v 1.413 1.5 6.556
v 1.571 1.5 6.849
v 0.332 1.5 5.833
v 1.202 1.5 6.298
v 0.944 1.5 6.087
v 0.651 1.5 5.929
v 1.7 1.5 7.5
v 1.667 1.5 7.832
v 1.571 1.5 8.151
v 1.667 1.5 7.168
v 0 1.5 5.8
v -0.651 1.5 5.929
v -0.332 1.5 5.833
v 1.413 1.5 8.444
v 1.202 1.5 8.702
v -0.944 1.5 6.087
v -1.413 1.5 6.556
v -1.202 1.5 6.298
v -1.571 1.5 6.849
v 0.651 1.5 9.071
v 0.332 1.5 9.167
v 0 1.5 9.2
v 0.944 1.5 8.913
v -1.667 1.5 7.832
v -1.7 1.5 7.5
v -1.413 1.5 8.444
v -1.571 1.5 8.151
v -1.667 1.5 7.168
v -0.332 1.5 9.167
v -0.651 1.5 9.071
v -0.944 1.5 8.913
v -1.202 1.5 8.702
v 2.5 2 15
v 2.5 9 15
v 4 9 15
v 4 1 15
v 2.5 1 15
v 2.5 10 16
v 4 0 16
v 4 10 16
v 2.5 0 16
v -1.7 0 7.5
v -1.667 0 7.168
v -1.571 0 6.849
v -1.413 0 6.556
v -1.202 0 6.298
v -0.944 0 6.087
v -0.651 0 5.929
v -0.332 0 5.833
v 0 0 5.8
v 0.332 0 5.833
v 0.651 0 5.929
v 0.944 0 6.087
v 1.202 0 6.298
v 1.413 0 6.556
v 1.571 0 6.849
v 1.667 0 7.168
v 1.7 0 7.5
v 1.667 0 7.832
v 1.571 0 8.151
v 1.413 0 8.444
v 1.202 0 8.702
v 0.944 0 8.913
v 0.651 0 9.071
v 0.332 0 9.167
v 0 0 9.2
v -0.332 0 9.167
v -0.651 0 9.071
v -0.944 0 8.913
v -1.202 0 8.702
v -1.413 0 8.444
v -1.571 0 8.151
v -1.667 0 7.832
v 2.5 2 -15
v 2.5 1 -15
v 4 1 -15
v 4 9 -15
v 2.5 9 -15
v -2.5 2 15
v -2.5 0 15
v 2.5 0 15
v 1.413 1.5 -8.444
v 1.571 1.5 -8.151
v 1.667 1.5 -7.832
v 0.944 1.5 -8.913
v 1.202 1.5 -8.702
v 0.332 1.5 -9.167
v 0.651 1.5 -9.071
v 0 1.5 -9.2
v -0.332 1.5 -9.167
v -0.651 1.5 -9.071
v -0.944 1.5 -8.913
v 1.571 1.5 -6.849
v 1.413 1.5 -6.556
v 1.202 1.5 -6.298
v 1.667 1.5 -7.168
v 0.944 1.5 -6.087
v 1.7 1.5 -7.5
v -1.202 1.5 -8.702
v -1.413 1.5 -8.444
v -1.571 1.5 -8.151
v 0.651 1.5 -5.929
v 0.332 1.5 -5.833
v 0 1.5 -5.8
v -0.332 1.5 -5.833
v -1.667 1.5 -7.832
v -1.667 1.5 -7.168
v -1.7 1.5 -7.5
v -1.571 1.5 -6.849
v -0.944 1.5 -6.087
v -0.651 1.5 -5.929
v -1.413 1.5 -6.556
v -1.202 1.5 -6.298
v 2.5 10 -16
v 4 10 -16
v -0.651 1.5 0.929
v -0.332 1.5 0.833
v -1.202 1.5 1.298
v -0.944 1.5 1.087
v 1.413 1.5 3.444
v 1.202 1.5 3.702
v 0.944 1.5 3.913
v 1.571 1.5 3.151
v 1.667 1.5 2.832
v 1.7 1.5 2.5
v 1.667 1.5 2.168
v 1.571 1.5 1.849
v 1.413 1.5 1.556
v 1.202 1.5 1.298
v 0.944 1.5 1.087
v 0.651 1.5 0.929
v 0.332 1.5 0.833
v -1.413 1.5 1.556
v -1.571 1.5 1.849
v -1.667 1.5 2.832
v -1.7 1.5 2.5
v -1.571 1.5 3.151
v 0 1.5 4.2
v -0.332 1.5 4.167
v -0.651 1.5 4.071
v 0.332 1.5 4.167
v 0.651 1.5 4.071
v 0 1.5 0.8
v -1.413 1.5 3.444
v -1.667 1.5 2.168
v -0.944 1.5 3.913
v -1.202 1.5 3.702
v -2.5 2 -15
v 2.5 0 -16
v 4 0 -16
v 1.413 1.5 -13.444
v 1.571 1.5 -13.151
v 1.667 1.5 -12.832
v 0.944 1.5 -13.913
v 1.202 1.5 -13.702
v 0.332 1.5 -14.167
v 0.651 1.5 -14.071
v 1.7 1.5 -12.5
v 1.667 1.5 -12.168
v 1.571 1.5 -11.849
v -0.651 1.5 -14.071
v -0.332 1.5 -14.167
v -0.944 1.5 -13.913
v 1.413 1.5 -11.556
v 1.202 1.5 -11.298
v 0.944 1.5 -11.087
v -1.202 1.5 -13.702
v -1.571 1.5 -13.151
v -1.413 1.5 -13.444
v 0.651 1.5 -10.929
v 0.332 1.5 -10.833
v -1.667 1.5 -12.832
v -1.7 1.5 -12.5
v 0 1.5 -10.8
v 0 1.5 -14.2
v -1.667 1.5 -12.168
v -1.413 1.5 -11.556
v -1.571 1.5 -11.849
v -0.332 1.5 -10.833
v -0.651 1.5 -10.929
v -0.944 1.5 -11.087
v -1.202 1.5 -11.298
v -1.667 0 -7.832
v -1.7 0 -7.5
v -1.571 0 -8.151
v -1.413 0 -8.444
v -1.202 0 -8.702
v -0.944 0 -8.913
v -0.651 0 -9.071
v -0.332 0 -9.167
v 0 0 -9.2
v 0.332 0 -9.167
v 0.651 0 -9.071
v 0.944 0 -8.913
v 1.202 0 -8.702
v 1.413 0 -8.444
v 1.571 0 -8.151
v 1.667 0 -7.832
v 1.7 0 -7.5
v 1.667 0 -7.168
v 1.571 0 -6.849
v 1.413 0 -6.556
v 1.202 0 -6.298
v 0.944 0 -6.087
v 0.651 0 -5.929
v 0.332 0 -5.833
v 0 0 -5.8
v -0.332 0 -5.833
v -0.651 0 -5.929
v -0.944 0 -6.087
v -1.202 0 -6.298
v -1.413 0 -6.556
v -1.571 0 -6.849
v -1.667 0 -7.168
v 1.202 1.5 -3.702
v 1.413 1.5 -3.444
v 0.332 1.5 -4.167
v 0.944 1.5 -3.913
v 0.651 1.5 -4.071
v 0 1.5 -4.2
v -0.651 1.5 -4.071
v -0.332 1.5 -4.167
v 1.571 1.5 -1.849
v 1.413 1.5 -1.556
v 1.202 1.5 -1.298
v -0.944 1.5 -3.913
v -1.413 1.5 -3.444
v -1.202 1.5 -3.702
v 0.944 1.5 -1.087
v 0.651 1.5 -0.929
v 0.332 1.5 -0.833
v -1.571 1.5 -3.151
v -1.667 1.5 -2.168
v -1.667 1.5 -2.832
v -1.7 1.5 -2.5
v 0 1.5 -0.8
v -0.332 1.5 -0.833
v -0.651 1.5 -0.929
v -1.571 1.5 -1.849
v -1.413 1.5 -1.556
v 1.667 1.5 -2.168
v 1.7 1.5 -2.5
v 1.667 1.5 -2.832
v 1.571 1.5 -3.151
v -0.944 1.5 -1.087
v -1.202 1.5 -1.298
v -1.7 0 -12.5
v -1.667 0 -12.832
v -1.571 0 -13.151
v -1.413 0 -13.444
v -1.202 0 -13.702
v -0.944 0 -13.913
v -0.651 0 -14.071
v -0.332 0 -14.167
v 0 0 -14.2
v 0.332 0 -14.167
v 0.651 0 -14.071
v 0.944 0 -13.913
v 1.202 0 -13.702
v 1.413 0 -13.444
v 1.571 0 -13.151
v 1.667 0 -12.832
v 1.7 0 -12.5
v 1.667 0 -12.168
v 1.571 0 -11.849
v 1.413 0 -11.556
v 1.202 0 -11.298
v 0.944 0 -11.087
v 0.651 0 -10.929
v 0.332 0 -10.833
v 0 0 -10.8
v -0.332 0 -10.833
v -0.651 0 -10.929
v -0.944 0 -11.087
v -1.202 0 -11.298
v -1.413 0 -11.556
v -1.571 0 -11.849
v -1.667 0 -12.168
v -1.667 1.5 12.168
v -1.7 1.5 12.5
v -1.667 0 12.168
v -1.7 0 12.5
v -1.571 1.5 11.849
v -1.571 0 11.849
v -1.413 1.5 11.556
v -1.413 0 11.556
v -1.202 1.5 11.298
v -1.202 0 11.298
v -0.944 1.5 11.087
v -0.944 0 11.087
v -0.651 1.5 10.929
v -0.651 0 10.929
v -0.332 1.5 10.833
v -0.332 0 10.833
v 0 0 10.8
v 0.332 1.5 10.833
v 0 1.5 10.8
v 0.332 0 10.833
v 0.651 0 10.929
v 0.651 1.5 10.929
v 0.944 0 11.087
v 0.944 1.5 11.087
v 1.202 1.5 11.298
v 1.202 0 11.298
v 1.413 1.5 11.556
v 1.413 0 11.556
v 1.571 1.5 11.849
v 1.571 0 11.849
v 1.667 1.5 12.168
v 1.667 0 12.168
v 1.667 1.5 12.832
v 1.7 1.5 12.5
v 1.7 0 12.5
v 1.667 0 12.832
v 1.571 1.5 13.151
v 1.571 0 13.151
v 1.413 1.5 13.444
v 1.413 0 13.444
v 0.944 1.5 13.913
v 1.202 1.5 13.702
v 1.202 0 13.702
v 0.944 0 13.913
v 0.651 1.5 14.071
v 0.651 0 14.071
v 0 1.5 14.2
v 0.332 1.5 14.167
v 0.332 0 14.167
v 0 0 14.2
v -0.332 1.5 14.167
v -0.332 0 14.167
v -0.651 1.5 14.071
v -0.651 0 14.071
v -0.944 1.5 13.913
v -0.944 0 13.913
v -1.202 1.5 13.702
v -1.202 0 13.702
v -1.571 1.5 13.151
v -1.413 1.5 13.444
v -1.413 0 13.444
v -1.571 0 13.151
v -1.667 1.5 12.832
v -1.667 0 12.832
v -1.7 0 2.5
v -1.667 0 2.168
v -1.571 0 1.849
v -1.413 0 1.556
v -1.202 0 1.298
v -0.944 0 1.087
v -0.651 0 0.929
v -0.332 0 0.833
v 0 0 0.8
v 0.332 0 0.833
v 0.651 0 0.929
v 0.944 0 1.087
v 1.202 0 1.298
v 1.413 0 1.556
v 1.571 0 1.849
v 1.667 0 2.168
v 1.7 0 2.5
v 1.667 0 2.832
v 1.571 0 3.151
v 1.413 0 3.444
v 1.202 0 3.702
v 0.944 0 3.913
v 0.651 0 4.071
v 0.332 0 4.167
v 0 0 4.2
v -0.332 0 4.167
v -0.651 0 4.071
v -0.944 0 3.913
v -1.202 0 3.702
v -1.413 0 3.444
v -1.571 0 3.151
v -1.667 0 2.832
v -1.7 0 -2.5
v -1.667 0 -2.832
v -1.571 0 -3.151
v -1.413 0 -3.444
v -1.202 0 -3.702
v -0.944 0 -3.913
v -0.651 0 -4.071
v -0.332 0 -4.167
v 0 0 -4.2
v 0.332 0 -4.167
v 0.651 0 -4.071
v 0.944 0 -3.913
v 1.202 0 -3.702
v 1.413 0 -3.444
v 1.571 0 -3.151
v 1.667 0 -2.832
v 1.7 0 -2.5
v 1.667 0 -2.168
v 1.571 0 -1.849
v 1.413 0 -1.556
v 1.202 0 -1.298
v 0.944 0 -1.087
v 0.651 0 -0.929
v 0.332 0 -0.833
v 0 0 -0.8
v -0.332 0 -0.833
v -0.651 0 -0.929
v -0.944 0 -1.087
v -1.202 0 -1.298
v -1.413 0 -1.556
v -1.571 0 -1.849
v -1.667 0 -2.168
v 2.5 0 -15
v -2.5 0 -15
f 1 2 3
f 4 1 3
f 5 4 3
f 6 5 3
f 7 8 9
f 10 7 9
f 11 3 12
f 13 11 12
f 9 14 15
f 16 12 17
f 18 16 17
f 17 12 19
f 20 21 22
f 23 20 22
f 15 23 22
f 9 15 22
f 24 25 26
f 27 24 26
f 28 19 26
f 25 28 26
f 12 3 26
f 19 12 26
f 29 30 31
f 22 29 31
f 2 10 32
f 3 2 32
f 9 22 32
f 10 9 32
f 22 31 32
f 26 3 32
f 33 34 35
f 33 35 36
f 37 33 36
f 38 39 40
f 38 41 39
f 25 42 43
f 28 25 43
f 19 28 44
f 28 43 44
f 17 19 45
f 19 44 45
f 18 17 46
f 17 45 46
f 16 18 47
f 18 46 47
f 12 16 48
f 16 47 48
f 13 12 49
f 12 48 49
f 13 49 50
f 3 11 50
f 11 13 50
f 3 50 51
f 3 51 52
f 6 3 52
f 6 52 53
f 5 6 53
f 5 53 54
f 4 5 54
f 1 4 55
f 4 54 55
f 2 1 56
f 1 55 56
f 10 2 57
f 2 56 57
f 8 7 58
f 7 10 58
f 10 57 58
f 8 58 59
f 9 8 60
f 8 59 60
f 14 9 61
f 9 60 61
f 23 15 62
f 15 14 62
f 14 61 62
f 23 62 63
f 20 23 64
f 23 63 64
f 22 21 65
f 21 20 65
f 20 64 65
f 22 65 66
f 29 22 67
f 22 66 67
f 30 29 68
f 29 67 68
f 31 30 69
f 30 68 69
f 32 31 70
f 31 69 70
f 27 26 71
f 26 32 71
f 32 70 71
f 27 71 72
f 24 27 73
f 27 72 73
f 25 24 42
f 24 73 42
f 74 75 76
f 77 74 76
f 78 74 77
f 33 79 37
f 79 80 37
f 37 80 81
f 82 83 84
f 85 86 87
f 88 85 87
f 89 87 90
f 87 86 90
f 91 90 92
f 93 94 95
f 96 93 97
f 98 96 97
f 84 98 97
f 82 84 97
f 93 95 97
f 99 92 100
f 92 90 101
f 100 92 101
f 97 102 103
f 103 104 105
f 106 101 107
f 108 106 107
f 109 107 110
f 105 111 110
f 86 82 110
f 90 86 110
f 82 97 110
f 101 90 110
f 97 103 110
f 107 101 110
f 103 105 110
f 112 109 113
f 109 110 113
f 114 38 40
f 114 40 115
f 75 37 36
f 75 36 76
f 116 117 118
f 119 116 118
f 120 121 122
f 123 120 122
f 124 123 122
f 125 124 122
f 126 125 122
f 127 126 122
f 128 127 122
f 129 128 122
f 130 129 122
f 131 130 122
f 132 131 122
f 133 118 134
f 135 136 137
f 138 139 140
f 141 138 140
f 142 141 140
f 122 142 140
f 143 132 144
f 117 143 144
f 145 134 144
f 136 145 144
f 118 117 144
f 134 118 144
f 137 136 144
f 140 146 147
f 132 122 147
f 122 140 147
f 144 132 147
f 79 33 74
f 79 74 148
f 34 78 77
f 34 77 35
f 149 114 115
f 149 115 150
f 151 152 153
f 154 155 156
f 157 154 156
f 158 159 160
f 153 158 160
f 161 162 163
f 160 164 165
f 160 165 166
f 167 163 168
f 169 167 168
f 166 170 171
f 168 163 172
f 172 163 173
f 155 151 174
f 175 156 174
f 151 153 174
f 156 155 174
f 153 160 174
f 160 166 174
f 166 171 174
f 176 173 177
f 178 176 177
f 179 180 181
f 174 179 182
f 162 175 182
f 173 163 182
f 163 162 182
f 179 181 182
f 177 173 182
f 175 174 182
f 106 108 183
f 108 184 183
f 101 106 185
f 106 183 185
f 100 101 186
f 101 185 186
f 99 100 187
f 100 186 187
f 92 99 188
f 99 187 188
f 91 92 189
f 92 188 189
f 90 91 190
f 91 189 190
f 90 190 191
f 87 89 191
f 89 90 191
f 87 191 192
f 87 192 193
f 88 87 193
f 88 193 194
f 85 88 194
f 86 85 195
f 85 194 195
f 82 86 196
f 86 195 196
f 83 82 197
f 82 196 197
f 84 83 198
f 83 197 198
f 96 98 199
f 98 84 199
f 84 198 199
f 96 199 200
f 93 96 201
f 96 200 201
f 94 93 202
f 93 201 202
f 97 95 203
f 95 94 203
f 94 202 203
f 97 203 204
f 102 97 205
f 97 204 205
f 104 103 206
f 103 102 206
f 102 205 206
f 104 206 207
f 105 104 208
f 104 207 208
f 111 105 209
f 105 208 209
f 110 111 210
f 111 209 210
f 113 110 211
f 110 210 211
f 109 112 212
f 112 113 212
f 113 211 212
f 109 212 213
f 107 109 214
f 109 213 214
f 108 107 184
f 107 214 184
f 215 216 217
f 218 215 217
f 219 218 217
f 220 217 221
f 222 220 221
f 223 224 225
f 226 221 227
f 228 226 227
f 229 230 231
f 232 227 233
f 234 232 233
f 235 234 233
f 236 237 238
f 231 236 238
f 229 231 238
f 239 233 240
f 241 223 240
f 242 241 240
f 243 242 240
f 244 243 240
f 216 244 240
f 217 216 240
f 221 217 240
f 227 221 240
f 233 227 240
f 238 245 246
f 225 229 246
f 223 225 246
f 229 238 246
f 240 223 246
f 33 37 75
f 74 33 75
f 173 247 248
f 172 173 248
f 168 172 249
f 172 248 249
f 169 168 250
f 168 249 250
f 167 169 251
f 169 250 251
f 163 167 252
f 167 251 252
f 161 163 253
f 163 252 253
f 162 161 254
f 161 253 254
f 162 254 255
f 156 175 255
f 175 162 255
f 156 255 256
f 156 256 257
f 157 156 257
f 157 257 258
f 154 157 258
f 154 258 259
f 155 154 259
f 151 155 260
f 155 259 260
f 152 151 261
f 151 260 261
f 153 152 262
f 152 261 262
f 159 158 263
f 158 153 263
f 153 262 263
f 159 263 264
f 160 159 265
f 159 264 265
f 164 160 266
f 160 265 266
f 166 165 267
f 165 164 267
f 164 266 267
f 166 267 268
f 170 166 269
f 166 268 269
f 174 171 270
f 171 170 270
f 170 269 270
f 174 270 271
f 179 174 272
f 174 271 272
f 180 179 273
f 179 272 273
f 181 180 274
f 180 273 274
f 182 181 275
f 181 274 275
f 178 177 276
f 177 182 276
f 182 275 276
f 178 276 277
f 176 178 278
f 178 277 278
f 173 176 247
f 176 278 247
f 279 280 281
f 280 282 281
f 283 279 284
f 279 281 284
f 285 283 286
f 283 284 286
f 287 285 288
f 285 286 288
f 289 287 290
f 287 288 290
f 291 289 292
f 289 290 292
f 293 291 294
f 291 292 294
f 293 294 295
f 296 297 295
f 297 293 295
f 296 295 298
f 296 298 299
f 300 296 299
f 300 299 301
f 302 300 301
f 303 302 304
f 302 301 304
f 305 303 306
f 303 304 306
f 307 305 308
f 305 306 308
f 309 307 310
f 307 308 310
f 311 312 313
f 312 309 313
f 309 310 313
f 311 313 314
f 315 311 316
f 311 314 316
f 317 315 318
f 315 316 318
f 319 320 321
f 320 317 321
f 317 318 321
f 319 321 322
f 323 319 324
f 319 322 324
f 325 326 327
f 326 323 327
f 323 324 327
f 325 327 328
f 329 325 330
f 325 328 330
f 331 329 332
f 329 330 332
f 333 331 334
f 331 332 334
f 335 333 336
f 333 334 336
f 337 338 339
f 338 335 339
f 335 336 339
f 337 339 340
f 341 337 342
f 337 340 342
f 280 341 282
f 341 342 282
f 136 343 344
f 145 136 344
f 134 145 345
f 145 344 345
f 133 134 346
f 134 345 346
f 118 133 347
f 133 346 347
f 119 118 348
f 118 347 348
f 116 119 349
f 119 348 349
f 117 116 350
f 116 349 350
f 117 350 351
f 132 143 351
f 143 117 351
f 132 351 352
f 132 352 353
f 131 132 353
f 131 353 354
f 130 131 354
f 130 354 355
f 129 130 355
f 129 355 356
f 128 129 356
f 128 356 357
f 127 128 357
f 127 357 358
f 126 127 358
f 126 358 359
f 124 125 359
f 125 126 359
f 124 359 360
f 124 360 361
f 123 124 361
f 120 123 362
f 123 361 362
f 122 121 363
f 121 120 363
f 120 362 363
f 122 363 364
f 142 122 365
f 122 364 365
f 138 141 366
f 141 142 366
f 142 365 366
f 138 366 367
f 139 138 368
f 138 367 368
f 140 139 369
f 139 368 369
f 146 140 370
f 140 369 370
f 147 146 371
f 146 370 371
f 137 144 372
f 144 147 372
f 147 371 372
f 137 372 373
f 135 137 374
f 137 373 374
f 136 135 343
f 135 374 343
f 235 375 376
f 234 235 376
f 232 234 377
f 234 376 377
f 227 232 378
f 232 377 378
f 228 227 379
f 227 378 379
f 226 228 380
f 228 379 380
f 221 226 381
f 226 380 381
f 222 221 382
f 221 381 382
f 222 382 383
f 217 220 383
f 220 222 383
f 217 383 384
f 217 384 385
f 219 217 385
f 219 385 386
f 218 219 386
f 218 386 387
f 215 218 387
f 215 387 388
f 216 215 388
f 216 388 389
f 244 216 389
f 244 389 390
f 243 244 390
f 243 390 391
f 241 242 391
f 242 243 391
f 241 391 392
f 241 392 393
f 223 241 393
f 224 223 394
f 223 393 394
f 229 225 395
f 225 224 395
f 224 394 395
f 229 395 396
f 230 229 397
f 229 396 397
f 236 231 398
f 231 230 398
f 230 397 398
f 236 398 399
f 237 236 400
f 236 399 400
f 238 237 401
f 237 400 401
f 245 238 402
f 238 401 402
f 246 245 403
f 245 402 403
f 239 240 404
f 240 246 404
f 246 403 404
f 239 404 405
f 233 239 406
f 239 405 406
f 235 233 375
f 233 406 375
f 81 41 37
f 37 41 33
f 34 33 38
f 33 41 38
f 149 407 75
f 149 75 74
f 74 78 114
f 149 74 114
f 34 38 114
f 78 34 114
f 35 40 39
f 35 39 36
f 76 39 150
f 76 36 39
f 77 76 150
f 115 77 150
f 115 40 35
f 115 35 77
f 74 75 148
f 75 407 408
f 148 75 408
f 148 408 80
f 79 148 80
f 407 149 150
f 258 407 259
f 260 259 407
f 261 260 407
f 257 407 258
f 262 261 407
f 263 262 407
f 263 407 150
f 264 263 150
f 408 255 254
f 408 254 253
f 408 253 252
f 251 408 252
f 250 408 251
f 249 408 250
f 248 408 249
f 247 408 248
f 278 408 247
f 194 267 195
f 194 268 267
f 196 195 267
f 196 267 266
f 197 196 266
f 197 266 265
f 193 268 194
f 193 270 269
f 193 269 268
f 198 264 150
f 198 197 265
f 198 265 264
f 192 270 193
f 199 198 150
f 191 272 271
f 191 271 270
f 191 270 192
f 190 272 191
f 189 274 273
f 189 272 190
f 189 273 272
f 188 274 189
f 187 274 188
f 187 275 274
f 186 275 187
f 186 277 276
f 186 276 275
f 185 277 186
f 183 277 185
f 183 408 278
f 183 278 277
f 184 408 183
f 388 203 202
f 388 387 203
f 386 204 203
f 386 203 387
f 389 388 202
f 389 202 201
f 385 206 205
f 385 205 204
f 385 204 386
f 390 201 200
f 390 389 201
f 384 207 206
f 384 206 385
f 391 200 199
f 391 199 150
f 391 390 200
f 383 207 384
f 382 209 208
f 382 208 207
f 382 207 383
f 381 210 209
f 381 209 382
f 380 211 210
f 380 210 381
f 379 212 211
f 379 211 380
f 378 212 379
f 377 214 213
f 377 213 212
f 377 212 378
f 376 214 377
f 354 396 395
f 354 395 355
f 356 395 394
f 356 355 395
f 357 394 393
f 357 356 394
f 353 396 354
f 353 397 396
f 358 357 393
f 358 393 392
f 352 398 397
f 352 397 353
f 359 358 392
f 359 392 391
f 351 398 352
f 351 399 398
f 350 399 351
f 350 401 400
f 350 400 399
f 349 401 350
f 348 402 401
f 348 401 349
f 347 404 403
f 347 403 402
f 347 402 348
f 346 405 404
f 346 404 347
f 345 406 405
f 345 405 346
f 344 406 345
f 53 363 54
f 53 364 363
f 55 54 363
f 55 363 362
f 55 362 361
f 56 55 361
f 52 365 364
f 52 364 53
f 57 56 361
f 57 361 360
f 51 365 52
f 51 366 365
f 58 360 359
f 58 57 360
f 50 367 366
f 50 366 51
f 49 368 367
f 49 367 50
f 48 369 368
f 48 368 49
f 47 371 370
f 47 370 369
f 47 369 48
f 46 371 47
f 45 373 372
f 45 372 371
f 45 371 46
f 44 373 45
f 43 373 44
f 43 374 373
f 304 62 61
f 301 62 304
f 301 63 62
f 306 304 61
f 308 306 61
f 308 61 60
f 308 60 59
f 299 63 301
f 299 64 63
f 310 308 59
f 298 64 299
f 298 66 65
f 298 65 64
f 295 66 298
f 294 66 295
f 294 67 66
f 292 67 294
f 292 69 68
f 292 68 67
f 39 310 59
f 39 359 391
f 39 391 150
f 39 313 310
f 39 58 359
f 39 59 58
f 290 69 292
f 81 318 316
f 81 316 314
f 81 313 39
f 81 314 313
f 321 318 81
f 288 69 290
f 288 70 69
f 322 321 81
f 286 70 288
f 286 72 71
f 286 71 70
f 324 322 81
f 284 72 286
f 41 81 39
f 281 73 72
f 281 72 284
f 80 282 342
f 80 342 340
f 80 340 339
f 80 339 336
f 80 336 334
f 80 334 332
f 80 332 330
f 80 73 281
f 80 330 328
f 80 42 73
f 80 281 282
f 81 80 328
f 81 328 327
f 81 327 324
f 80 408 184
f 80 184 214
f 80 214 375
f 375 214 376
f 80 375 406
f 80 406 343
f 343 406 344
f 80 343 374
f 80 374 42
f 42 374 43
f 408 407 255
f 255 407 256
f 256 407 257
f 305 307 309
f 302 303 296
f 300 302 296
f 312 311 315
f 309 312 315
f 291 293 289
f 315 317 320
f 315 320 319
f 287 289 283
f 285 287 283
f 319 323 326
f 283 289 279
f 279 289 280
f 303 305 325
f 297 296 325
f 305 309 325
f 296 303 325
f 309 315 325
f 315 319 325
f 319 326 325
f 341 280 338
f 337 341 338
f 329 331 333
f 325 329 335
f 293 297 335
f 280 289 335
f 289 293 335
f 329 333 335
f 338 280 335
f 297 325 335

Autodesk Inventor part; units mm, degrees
ref_plane "YZ Plane" through (0, 0, 0) normal (1, 0, 0) x (0, 1, 0)
ref_plane "XZ Plane" through (0, 0, 0) normal (0, 1, 0) x (-1, 0, 0)
ref_plane "XY Plane" through (0, 0, 0) normal (0, 0, 1) x (1, 0, 0)
sketch "草圖1" plane through (0, 0, 0) normal (0, 1, 0) x (-1, 0, 0)
  line L0 (2.5, 15) -> (-2.5, 15)
  line L1 (-2.5, 15) -> (-2.5, -15)
  line L2 (-2.5, -15) -> (2.5, -15)
  line L3 (2.5, -15) -> (2.5, 15)
  circle A0 centre (0, 12.5) radius 1.7
  circle A1 centre (0, 7.5) radius 1.7
  circle A2 centre (0, 2.5) radius 1.7
  circle A3 centre (0, -2.5) radius 1.7
  circle A4 centre (0, -7.5) radius 1.7
  circle A5 centre (0, -12.5) radius 1.7
  point P0 (0, 0)
  point P1 (2.5, 0)
  point P2 (0, 15)
  dimension "d0" = 5
  dimension "d1" = 30
  dimension "d2" = 3.4
  dimension "d3" = 2.5
  dimension "d4" = 2.5
  dimension "d7" = 5
extrude "擠出1" add sketch "草圖1" along normal blind 2 contours L3 L2 L1 L0 | A0 | A1 | A2 | A3 | A4 | A5
extrude "擠出2" cut sketch "草圖1" along normal blind 1.5 contours A0 | A1 | A2 | A3 | A4 | A5
sketch "草圖2" plane through (2.5, 0, 15) normal (1, 0, 0) x (0, 0, -1)
  line L0 (-1, 10) -> (31, 10)
  line L1 (31, 10) -> (31, 0)
  line L2 (31, 0) -> (-1, 0)
  line L3 (-1, 0) -> (-1, 10)
  line L4 (0, 0) -> (30, 0) projected
  line L5 (30, 9) -> (0, 9)
  line L6 (0, 9) -> (0, 1)
  line L7 (0, 1) -> (30, 1)
  line L8 (30, 1) -> (30, 9)
  point P0 (15, 0)
  point P1 (15, 10)
  point P2 (15, 0)
  point P3 (15, 0)
  dimension "d16" = 32
  dimension "d17" = 10
  dimension "d18" = 1
extrude "擠出3" add sketch "草圖2" along normal blind 1.5
properties part number "110033226_ipt_20_塔樓窗戶"
